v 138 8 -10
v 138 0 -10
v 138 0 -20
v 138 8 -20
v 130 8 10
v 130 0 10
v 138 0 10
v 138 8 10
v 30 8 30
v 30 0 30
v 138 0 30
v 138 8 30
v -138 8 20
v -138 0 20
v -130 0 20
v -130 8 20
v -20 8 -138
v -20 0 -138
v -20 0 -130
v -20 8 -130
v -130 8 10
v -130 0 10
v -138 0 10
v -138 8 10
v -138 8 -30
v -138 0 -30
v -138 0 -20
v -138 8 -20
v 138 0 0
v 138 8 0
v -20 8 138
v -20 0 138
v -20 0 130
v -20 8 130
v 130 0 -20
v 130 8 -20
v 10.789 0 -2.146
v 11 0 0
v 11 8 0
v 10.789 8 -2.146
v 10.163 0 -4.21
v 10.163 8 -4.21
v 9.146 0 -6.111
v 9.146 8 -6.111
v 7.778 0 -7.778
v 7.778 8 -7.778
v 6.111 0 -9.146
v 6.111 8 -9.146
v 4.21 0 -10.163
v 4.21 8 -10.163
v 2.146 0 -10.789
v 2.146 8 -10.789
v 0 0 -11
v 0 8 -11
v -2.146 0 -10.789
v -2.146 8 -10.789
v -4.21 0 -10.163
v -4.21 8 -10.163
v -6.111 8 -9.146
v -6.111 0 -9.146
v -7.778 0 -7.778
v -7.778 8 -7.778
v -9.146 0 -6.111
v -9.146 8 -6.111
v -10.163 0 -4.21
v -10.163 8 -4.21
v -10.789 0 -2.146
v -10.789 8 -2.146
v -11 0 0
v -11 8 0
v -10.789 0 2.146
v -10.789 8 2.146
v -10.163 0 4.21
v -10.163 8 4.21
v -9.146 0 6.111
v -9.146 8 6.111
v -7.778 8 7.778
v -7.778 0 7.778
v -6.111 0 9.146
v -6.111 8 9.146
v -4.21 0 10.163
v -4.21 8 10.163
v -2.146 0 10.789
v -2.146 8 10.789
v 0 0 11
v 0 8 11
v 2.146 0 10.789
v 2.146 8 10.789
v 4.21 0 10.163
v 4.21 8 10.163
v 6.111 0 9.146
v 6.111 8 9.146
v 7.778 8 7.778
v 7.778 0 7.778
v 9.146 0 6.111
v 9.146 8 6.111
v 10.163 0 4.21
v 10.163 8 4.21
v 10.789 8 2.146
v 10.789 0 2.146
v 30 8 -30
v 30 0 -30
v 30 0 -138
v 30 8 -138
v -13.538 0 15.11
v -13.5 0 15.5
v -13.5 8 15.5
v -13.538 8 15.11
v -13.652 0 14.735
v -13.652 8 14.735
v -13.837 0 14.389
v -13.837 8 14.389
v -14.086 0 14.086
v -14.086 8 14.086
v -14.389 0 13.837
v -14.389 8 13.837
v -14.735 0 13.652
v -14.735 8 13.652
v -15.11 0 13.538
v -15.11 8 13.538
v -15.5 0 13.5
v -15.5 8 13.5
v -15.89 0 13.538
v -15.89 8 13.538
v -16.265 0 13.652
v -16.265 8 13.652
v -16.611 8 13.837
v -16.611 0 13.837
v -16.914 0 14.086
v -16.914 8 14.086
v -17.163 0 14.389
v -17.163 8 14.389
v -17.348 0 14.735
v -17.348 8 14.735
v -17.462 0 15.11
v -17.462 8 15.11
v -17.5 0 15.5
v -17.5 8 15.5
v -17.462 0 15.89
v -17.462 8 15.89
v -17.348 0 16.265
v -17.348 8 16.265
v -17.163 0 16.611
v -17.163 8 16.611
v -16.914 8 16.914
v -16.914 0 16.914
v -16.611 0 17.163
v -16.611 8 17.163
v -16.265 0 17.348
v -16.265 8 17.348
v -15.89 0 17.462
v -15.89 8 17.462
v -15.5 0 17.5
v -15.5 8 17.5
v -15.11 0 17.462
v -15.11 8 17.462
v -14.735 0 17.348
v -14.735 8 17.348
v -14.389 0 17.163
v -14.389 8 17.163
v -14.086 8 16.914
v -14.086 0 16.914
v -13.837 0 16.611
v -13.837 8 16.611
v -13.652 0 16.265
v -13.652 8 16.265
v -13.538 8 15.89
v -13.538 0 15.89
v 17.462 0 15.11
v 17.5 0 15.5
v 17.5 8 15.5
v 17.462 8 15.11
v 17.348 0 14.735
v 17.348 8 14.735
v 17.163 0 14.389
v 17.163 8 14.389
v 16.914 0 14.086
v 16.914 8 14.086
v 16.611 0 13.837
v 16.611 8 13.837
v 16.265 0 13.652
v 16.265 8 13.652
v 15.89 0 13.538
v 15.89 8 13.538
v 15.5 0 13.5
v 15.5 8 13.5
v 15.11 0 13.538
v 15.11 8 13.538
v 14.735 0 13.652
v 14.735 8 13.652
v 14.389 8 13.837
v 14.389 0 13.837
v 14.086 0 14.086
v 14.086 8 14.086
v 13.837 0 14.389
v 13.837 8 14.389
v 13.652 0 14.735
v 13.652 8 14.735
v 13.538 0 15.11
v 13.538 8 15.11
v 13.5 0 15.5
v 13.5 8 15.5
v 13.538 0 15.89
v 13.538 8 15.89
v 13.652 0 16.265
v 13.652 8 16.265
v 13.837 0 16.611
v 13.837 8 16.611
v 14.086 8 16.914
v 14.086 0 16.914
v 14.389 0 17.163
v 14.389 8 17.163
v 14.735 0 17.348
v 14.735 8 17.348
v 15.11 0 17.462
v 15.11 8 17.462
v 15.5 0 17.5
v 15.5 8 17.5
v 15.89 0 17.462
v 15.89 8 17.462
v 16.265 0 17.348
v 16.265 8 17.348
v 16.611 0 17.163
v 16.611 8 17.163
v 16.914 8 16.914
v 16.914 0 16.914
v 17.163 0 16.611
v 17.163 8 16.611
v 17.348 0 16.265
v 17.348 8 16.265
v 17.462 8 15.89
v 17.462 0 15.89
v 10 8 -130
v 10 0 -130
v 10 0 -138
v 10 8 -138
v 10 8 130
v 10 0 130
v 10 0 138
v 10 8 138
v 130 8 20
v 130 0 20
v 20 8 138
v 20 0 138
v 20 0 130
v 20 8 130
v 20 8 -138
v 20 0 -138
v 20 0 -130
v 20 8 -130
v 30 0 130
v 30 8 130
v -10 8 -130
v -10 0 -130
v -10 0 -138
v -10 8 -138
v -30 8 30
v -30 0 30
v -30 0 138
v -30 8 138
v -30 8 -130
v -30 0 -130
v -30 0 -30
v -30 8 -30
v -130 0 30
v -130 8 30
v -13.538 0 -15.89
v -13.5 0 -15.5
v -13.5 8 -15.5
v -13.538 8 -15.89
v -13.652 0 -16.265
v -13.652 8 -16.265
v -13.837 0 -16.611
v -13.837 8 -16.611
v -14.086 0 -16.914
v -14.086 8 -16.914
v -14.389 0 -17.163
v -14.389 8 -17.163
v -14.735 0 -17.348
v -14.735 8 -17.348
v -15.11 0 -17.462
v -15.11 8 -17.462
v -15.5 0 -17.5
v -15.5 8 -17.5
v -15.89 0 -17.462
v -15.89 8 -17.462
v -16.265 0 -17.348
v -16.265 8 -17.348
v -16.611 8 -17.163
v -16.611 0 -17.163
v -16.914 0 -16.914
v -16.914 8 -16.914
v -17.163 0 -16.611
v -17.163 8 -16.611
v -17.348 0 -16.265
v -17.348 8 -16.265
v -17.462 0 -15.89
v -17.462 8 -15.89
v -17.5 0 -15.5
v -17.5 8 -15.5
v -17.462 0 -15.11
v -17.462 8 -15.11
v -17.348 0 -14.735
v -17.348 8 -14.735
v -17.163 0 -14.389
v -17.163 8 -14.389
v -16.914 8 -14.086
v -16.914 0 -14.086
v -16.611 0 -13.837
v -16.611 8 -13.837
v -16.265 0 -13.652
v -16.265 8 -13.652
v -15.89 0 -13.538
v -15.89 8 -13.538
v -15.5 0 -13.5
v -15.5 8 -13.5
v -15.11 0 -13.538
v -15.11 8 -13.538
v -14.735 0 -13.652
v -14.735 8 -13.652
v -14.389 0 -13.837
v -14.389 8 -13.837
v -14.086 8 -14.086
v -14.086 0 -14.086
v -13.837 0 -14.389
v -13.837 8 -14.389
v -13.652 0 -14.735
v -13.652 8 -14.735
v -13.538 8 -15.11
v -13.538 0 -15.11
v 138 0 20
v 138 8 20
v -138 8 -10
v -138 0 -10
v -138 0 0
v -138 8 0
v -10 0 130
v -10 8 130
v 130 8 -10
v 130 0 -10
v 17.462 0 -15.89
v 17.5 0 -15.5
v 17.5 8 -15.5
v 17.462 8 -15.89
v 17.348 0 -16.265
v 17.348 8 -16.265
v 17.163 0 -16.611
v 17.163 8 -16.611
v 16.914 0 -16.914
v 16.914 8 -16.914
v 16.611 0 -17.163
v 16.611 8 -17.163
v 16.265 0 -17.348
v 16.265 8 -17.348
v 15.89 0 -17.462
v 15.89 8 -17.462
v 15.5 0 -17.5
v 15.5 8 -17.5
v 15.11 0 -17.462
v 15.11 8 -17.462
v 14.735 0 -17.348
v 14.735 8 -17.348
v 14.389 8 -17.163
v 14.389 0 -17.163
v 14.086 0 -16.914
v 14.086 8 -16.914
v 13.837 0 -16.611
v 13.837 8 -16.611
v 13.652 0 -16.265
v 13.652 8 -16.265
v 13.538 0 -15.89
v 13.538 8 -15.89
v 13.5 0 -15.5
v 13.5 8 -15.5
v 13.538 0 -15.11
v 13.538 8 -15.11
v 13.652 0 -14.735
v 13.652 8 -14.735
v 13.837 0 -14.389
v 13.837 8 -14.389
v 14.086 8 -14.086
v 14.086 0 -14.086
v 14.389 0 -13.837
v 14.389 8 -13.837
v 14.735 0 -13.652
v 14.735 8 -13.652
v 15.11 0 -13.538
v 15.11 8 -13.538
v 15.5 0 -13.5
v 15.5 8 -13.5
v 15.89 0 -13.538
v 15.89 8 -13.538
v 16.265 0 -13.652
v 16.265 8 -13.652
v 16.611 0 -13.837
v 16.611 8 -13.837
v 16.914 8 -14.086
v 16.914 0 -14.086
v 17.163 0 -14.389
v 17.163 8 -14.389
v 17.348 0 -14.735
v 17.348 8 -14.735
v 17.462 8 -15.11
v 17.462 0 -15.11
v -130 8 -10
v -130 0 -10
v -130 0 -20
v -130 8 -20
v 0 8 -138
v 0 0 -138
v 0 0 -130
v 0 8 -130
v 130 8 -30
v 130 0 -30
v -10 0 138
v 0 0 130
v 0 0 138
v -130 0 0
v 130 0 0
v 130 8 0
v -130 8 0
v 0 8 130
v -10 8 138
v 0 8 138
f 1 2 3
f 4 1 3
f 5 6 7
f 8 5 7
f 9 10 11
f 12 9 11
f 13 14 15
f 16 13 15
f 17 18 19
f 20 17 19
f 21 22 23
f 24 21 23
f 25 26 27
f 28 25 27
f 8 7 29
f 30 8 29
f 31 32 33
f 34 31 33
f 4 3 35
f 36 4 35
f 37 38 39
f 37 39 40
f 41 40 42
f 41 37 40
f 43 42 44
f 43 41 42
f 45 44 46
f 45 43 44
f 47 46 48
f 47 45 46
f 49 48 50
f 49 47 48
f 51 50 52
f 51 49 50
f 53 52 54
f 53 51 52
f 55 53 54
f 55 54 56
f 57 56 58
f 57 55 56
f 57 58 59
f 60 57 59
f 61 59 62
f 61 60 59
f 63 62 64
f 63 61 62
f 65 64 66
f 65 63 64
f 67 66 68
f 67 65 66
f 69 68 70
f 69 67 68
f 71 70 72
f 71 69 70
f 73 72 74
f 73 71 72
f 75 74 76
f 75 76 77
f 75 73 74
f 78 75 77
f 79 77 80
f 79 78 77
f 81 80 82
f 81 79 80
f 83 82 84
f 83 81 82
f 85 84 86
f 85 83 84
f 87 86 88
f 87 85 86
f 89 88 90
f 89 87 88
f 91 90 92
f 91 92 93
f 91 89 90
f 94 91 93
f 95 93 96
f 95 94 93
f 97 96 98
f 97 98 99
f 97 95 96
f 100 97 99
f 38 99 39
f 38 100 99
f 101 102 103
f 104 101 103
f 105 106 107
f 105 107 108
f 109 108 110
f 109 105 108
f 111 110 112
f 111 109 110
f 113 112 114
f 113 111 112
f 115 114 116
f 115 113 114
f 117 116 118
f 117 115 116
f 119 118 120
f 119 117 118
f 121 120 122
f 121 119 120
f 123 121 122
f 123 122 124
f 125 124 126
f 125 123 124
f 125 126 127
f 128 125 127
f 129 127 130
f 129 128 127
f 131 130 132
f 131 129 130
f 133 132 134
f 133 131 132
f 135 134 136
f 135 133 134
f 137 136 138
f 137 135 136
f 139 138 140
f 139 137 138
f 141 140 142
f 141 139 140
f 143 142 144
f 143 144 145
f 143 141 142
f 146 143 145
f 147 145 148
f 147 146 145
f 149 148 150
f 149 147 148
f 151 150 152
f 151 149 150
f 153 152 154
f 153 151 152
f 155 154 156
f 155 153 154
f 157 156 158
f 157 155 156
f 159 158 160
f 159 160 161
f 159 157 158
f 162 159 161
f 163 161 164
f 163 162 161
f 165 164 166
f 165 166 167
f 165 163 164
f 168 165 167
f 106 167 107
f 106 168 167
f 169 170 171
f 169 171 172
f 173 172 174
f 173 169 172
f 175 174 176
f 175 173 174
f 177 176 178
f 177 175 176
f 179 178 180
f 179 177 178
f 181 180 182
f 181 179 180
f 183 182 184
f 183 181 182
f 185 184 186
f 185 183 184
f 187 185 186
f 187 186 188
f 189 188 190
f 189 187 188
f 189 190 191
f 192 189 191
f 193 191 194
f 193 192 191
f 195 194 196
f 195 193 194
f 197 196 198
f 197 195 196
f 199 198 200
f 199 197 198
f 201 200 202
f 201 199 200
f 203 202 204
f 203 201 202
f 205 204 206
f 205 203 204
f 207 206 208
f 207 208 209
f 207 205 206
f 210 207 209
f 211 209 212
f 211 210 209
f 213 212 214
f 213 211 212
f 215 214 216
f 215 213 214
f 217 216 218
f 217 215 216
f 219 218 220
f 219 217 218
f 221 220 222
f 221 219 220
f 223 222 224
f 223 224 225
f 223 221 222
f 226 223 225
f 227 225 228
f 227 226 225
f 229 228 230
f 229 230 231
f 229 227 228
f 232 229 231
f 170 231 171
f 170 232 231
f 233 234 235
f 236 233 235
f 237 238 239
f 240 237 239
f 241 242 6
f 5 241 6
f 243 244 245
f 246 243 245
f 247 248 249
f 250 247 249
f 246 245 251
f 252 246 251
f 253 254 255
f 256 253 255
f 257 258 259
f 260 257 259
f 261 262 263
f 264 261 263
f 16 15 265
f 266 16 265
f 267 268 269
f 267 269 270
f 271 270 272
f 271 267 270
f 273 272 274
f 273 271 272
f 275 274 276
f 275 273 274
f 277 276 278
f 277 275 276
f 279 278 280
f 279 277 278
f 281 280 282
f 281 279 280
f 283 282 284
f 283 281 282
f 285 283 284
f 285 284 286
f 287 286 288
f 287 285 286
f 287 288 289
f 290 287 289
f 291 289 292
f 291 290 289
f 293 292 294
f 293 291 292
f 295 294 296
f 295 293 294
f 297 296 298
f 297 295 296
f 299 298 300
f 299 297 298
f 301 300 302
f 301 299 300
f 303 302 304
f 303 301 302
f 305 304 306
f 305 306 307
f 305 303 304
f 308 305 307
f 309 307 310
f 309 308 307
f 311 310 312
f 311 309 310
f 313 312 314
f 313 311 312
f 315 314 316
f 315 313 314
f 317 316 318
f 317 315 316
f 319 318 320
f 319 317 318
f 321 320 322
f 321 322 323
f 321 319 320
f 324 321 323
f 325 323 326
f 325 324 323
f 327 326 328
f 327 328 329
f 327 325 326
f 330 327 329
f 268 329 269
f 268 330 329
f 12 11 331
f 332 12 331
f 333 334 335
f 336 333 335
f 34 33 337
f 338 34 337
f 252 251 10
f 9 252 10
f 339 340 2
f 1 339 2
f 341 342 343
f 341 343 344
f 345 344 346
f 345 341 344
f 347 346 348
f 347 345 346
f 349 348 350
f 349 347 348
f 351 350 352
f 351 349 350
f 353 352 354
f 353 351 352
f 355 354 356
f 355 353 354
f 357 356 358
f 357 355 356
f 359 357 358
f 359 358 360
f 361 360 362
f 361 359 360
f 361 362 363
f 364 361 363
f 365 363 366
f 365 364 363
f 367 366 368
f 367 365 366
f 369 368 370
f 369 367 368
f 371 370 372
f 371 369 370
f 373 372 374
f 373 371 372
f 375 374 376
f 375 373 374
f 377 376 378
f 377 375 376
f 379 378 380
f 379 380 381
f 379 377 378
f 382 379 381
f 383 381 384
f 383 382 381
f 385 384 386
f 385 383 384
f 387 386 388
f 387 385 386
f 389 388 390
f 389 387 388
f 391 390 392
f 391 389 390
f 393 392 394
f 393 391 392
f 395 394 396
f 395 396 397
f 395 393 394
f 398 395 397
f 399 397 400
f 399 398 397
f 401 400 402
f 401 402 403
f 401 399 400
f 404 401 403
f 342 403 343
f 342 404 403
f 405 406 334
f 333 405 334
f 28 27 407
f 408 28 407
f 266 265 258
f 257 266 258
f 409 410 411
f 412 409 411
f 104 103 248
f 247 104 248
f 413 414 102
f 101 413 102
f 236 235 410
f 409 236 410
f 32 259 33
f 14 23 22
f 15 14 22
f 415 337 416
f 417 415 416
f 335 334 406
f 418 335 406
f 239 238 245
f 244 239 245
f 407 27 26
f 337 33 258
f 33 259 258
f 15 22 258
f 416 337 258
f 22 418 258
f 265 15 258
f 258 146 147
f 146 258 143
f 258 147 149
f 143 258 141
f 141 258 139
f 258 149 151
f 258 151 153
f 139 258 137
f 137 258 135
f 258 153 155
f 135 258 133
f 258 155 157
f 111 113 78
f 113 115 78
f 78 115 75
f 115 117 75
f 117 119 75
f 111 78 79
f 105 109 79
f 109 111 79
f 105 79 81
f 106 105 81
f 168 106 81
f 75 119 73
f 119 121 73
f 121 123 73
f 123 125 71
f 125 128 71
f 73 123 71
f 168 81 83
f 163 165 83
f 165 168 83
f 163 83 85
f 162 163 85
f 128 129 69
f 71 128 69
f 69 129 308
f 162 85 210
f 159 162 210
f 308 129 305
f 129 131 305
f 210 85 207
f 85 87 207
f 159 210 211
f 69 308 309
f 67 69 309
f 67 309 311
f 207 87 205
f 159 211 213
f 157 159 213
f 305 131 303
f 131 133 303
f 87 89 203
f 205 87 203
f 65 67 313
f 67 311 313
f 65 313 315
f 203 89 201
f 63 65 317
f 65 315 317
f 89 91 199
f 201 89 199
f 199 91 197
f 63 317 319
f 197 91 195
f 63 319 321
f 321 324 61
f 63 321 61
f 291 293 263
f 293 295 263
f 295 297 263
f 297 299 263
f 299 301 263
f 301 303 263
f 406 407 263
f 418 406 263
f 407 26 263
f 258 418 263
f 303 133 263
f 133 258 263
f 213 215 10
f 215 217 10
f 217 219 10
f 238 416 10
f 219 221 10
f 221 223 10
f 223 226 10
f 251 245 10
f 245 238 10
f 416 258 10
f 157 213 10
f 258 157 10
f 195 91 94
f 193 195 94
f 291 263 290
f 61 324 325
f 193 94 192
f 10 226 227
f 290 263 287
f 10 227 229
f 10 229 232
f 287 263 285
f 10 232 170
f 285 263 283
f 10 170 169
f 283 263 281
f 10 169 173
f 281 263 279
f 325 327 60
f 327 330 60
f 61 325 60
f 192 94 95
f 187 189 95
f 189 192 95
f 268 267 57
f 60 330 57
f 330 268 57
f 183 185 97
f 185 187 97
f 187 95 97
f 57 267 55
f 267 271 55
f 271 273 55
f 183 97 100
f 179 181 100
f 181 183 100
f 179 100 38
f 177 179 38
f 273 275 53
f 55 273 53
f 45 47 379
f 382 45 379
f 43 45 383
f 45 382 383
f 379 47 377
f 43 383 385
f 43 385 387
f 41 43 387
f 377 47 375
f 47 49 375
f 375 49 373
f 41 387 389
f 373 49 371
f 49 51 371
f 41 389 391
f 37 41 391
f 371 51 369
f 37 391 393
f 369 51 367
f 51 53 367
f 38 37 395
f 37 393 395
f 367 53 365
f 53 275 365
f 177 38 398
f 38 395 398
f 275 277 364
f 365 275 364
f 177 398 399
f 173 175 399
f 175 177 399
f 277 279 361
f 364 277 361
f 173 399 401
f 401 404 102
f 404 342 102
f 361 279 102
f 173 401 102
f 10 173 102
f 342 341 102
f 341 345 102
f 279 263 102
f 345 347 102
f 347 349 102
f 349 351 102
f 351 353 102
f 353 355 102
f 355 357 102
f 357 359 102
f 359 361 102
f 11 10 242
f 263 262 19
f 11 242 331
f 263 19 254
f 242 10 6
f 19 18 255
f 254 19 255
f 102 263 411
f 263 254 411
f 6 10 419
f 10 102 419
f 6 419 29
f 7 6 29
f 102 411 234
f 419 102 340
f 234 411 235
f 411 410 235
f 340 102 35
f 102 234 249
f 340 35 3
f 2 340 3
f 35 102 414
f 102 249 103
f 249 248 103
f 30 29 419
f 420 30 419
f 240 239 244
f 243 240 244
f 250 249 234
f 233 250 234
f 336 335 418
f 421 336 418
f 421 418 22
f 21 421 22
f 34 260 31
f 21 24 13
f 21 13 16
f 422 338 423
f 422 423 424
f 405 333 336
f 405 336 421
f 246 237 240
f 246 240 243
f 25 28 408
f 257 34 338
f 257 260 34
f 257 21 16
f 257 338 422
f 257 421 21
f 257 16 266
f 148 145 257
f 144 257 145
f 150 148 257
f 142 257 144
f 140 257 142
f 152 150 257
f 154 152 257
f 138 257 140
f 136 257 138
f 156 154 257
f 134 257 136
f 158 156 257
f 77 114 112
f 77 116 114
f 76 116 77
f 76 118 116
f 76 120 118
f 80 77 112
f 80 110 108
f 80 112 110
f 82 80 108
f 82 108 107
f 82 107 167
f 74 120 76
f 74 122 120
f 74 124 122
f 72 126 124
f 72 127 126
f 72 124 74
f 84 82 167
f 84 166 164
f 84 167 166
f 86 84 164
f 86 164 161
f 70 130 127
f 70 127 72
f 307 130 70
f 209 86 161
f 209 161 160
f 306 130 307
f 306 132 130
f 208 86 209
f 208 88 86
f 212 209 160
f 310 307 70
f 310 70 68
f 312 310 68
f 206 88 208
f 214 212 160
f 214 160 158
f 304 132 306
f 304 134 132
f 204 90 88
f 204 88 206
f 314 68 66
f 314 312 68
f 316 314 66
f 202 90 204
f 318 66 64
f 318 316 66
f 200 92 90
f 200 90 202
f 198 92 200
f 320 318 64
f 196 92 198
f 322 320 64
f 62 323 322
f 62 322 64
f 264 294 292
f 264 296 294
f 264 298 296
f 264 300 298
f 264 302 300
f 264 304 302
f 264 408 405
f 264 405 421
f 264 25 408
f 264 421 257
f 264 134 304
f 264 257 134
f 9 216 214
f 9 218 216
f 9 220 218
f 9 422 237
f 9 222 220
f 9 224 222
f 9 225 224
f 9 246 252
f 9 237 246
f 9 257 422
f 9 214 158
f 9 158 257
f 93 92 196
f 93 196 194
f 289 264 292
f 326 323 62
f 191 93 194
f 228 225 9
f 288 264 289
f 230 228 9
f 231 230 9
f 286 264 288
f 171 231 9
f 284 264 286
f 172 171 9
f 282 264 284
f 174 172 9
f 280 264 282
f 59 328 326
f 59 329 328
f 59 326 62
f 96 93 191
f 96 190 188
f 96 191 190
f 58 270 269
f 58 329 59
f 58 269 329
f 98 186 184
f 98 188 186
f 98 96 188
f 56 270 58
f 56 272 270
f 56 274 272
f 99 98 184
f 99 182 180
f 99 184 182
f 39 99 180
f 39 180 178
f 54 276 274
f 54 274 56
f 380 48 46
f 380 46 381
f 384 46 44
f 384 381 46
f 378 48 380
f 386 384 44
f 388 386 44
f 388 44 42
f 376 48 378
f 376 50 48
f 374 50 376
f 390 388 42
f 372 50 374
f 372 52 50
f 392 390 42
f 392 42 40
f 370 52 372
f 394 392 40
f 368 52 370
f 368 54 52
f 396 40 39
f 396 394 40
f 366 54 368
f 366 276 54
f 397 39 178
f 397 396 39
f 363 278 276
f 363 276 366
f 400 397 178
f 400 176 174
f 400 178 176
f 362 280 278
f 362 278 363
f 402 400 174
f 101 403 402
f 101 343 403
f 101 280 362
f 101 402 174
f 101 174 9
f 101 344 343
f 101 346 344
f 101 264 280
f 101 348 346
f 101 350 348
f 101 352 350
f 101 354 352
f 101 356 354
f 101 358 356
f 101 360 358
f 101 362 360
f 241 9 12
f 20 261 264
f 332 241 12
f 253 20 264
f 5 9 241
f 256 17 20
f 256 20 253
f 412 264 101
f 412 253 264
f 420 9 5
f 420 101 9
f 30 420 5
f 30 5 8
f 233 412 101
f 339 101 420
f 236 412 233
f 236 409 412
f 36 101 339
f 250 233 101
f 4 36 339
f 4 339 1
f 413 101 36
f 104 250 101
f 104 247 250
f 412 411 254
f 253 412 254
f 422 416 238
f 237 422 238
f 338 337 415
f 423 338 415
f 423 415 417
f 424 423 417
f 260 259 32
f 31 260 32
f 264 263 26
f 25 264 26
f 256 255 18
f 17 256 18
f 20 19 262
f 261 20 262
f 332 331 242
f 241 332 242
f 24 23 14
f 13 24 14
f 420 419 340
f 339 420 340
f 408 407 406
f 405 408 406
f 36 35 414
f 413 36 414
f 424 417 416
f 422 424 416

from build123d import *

# Parameters (mm, degrees)
SKETCH_1_R      = 11
SKETCH_1_R_2    = 2
EXTRUDE_1_DEPTH = 8


with BuildPart() as part:
    # 草图1 → 凸台-拉伸1 (new body)
    with BuildSketch(Plane(origin=(0, 0, 0), x_dir=(1, 0, 0), z_dir=(0, 1, 0))):
        Polygon((-130, -30), (-30, -30), (-30, -138), (-20, -138), (-20, -130), (-10, -130), (-10, -138), (0, -138), (0, -130), (10, -130), (10, -138), (20, -138), (20, -130), (30, -130), (30, -30), (138, -30), (138, -20), (130, -20), (130, -10), (138, -10), (138, 0), (130, 0), (130, 10), (138, 10), (138, 20), (130, 20), (130, 30), (30, 30), (30, 138), (20, 138), (20, 130), (10, 130), (10, 138), (0, 138), (0, 130), (-10, 130), (-10, 138), (-20, 138), (-20, 130), (-30, 130), (-30, 30), (-138, 30), (-138, 20), (-130, 20), (-130, 10), (-138, 10), (-138, 0), (-130, 0), (-130, -10), (-138, -10), (-138, -20), (-130, -20), align=None)
        Circle(SKETCH_1_R, mode=Mode.SUBTRACT)
        with Locations((-15.5, 15.5)):
            Circle(SKETCH_1_R_2, mode=Mode.SUBTRACT)
        with Locations((15.5, 15.5)):
            Circle(SKETCH_1_R_2, mode=Mode.SUBTRACT)
        with Locations((-15.5, -15.5)):
            Circle(SKETCH_1_R_2, mode=Mode.SUBTRACT)
        with Locations((15.5, -15.5)):
            Circle(SKETCH_1_R_2, mode=Mode.SUBTRACT)
    extrude(amount=EXTRUDE_1_DEPTH)


solid = part.part
